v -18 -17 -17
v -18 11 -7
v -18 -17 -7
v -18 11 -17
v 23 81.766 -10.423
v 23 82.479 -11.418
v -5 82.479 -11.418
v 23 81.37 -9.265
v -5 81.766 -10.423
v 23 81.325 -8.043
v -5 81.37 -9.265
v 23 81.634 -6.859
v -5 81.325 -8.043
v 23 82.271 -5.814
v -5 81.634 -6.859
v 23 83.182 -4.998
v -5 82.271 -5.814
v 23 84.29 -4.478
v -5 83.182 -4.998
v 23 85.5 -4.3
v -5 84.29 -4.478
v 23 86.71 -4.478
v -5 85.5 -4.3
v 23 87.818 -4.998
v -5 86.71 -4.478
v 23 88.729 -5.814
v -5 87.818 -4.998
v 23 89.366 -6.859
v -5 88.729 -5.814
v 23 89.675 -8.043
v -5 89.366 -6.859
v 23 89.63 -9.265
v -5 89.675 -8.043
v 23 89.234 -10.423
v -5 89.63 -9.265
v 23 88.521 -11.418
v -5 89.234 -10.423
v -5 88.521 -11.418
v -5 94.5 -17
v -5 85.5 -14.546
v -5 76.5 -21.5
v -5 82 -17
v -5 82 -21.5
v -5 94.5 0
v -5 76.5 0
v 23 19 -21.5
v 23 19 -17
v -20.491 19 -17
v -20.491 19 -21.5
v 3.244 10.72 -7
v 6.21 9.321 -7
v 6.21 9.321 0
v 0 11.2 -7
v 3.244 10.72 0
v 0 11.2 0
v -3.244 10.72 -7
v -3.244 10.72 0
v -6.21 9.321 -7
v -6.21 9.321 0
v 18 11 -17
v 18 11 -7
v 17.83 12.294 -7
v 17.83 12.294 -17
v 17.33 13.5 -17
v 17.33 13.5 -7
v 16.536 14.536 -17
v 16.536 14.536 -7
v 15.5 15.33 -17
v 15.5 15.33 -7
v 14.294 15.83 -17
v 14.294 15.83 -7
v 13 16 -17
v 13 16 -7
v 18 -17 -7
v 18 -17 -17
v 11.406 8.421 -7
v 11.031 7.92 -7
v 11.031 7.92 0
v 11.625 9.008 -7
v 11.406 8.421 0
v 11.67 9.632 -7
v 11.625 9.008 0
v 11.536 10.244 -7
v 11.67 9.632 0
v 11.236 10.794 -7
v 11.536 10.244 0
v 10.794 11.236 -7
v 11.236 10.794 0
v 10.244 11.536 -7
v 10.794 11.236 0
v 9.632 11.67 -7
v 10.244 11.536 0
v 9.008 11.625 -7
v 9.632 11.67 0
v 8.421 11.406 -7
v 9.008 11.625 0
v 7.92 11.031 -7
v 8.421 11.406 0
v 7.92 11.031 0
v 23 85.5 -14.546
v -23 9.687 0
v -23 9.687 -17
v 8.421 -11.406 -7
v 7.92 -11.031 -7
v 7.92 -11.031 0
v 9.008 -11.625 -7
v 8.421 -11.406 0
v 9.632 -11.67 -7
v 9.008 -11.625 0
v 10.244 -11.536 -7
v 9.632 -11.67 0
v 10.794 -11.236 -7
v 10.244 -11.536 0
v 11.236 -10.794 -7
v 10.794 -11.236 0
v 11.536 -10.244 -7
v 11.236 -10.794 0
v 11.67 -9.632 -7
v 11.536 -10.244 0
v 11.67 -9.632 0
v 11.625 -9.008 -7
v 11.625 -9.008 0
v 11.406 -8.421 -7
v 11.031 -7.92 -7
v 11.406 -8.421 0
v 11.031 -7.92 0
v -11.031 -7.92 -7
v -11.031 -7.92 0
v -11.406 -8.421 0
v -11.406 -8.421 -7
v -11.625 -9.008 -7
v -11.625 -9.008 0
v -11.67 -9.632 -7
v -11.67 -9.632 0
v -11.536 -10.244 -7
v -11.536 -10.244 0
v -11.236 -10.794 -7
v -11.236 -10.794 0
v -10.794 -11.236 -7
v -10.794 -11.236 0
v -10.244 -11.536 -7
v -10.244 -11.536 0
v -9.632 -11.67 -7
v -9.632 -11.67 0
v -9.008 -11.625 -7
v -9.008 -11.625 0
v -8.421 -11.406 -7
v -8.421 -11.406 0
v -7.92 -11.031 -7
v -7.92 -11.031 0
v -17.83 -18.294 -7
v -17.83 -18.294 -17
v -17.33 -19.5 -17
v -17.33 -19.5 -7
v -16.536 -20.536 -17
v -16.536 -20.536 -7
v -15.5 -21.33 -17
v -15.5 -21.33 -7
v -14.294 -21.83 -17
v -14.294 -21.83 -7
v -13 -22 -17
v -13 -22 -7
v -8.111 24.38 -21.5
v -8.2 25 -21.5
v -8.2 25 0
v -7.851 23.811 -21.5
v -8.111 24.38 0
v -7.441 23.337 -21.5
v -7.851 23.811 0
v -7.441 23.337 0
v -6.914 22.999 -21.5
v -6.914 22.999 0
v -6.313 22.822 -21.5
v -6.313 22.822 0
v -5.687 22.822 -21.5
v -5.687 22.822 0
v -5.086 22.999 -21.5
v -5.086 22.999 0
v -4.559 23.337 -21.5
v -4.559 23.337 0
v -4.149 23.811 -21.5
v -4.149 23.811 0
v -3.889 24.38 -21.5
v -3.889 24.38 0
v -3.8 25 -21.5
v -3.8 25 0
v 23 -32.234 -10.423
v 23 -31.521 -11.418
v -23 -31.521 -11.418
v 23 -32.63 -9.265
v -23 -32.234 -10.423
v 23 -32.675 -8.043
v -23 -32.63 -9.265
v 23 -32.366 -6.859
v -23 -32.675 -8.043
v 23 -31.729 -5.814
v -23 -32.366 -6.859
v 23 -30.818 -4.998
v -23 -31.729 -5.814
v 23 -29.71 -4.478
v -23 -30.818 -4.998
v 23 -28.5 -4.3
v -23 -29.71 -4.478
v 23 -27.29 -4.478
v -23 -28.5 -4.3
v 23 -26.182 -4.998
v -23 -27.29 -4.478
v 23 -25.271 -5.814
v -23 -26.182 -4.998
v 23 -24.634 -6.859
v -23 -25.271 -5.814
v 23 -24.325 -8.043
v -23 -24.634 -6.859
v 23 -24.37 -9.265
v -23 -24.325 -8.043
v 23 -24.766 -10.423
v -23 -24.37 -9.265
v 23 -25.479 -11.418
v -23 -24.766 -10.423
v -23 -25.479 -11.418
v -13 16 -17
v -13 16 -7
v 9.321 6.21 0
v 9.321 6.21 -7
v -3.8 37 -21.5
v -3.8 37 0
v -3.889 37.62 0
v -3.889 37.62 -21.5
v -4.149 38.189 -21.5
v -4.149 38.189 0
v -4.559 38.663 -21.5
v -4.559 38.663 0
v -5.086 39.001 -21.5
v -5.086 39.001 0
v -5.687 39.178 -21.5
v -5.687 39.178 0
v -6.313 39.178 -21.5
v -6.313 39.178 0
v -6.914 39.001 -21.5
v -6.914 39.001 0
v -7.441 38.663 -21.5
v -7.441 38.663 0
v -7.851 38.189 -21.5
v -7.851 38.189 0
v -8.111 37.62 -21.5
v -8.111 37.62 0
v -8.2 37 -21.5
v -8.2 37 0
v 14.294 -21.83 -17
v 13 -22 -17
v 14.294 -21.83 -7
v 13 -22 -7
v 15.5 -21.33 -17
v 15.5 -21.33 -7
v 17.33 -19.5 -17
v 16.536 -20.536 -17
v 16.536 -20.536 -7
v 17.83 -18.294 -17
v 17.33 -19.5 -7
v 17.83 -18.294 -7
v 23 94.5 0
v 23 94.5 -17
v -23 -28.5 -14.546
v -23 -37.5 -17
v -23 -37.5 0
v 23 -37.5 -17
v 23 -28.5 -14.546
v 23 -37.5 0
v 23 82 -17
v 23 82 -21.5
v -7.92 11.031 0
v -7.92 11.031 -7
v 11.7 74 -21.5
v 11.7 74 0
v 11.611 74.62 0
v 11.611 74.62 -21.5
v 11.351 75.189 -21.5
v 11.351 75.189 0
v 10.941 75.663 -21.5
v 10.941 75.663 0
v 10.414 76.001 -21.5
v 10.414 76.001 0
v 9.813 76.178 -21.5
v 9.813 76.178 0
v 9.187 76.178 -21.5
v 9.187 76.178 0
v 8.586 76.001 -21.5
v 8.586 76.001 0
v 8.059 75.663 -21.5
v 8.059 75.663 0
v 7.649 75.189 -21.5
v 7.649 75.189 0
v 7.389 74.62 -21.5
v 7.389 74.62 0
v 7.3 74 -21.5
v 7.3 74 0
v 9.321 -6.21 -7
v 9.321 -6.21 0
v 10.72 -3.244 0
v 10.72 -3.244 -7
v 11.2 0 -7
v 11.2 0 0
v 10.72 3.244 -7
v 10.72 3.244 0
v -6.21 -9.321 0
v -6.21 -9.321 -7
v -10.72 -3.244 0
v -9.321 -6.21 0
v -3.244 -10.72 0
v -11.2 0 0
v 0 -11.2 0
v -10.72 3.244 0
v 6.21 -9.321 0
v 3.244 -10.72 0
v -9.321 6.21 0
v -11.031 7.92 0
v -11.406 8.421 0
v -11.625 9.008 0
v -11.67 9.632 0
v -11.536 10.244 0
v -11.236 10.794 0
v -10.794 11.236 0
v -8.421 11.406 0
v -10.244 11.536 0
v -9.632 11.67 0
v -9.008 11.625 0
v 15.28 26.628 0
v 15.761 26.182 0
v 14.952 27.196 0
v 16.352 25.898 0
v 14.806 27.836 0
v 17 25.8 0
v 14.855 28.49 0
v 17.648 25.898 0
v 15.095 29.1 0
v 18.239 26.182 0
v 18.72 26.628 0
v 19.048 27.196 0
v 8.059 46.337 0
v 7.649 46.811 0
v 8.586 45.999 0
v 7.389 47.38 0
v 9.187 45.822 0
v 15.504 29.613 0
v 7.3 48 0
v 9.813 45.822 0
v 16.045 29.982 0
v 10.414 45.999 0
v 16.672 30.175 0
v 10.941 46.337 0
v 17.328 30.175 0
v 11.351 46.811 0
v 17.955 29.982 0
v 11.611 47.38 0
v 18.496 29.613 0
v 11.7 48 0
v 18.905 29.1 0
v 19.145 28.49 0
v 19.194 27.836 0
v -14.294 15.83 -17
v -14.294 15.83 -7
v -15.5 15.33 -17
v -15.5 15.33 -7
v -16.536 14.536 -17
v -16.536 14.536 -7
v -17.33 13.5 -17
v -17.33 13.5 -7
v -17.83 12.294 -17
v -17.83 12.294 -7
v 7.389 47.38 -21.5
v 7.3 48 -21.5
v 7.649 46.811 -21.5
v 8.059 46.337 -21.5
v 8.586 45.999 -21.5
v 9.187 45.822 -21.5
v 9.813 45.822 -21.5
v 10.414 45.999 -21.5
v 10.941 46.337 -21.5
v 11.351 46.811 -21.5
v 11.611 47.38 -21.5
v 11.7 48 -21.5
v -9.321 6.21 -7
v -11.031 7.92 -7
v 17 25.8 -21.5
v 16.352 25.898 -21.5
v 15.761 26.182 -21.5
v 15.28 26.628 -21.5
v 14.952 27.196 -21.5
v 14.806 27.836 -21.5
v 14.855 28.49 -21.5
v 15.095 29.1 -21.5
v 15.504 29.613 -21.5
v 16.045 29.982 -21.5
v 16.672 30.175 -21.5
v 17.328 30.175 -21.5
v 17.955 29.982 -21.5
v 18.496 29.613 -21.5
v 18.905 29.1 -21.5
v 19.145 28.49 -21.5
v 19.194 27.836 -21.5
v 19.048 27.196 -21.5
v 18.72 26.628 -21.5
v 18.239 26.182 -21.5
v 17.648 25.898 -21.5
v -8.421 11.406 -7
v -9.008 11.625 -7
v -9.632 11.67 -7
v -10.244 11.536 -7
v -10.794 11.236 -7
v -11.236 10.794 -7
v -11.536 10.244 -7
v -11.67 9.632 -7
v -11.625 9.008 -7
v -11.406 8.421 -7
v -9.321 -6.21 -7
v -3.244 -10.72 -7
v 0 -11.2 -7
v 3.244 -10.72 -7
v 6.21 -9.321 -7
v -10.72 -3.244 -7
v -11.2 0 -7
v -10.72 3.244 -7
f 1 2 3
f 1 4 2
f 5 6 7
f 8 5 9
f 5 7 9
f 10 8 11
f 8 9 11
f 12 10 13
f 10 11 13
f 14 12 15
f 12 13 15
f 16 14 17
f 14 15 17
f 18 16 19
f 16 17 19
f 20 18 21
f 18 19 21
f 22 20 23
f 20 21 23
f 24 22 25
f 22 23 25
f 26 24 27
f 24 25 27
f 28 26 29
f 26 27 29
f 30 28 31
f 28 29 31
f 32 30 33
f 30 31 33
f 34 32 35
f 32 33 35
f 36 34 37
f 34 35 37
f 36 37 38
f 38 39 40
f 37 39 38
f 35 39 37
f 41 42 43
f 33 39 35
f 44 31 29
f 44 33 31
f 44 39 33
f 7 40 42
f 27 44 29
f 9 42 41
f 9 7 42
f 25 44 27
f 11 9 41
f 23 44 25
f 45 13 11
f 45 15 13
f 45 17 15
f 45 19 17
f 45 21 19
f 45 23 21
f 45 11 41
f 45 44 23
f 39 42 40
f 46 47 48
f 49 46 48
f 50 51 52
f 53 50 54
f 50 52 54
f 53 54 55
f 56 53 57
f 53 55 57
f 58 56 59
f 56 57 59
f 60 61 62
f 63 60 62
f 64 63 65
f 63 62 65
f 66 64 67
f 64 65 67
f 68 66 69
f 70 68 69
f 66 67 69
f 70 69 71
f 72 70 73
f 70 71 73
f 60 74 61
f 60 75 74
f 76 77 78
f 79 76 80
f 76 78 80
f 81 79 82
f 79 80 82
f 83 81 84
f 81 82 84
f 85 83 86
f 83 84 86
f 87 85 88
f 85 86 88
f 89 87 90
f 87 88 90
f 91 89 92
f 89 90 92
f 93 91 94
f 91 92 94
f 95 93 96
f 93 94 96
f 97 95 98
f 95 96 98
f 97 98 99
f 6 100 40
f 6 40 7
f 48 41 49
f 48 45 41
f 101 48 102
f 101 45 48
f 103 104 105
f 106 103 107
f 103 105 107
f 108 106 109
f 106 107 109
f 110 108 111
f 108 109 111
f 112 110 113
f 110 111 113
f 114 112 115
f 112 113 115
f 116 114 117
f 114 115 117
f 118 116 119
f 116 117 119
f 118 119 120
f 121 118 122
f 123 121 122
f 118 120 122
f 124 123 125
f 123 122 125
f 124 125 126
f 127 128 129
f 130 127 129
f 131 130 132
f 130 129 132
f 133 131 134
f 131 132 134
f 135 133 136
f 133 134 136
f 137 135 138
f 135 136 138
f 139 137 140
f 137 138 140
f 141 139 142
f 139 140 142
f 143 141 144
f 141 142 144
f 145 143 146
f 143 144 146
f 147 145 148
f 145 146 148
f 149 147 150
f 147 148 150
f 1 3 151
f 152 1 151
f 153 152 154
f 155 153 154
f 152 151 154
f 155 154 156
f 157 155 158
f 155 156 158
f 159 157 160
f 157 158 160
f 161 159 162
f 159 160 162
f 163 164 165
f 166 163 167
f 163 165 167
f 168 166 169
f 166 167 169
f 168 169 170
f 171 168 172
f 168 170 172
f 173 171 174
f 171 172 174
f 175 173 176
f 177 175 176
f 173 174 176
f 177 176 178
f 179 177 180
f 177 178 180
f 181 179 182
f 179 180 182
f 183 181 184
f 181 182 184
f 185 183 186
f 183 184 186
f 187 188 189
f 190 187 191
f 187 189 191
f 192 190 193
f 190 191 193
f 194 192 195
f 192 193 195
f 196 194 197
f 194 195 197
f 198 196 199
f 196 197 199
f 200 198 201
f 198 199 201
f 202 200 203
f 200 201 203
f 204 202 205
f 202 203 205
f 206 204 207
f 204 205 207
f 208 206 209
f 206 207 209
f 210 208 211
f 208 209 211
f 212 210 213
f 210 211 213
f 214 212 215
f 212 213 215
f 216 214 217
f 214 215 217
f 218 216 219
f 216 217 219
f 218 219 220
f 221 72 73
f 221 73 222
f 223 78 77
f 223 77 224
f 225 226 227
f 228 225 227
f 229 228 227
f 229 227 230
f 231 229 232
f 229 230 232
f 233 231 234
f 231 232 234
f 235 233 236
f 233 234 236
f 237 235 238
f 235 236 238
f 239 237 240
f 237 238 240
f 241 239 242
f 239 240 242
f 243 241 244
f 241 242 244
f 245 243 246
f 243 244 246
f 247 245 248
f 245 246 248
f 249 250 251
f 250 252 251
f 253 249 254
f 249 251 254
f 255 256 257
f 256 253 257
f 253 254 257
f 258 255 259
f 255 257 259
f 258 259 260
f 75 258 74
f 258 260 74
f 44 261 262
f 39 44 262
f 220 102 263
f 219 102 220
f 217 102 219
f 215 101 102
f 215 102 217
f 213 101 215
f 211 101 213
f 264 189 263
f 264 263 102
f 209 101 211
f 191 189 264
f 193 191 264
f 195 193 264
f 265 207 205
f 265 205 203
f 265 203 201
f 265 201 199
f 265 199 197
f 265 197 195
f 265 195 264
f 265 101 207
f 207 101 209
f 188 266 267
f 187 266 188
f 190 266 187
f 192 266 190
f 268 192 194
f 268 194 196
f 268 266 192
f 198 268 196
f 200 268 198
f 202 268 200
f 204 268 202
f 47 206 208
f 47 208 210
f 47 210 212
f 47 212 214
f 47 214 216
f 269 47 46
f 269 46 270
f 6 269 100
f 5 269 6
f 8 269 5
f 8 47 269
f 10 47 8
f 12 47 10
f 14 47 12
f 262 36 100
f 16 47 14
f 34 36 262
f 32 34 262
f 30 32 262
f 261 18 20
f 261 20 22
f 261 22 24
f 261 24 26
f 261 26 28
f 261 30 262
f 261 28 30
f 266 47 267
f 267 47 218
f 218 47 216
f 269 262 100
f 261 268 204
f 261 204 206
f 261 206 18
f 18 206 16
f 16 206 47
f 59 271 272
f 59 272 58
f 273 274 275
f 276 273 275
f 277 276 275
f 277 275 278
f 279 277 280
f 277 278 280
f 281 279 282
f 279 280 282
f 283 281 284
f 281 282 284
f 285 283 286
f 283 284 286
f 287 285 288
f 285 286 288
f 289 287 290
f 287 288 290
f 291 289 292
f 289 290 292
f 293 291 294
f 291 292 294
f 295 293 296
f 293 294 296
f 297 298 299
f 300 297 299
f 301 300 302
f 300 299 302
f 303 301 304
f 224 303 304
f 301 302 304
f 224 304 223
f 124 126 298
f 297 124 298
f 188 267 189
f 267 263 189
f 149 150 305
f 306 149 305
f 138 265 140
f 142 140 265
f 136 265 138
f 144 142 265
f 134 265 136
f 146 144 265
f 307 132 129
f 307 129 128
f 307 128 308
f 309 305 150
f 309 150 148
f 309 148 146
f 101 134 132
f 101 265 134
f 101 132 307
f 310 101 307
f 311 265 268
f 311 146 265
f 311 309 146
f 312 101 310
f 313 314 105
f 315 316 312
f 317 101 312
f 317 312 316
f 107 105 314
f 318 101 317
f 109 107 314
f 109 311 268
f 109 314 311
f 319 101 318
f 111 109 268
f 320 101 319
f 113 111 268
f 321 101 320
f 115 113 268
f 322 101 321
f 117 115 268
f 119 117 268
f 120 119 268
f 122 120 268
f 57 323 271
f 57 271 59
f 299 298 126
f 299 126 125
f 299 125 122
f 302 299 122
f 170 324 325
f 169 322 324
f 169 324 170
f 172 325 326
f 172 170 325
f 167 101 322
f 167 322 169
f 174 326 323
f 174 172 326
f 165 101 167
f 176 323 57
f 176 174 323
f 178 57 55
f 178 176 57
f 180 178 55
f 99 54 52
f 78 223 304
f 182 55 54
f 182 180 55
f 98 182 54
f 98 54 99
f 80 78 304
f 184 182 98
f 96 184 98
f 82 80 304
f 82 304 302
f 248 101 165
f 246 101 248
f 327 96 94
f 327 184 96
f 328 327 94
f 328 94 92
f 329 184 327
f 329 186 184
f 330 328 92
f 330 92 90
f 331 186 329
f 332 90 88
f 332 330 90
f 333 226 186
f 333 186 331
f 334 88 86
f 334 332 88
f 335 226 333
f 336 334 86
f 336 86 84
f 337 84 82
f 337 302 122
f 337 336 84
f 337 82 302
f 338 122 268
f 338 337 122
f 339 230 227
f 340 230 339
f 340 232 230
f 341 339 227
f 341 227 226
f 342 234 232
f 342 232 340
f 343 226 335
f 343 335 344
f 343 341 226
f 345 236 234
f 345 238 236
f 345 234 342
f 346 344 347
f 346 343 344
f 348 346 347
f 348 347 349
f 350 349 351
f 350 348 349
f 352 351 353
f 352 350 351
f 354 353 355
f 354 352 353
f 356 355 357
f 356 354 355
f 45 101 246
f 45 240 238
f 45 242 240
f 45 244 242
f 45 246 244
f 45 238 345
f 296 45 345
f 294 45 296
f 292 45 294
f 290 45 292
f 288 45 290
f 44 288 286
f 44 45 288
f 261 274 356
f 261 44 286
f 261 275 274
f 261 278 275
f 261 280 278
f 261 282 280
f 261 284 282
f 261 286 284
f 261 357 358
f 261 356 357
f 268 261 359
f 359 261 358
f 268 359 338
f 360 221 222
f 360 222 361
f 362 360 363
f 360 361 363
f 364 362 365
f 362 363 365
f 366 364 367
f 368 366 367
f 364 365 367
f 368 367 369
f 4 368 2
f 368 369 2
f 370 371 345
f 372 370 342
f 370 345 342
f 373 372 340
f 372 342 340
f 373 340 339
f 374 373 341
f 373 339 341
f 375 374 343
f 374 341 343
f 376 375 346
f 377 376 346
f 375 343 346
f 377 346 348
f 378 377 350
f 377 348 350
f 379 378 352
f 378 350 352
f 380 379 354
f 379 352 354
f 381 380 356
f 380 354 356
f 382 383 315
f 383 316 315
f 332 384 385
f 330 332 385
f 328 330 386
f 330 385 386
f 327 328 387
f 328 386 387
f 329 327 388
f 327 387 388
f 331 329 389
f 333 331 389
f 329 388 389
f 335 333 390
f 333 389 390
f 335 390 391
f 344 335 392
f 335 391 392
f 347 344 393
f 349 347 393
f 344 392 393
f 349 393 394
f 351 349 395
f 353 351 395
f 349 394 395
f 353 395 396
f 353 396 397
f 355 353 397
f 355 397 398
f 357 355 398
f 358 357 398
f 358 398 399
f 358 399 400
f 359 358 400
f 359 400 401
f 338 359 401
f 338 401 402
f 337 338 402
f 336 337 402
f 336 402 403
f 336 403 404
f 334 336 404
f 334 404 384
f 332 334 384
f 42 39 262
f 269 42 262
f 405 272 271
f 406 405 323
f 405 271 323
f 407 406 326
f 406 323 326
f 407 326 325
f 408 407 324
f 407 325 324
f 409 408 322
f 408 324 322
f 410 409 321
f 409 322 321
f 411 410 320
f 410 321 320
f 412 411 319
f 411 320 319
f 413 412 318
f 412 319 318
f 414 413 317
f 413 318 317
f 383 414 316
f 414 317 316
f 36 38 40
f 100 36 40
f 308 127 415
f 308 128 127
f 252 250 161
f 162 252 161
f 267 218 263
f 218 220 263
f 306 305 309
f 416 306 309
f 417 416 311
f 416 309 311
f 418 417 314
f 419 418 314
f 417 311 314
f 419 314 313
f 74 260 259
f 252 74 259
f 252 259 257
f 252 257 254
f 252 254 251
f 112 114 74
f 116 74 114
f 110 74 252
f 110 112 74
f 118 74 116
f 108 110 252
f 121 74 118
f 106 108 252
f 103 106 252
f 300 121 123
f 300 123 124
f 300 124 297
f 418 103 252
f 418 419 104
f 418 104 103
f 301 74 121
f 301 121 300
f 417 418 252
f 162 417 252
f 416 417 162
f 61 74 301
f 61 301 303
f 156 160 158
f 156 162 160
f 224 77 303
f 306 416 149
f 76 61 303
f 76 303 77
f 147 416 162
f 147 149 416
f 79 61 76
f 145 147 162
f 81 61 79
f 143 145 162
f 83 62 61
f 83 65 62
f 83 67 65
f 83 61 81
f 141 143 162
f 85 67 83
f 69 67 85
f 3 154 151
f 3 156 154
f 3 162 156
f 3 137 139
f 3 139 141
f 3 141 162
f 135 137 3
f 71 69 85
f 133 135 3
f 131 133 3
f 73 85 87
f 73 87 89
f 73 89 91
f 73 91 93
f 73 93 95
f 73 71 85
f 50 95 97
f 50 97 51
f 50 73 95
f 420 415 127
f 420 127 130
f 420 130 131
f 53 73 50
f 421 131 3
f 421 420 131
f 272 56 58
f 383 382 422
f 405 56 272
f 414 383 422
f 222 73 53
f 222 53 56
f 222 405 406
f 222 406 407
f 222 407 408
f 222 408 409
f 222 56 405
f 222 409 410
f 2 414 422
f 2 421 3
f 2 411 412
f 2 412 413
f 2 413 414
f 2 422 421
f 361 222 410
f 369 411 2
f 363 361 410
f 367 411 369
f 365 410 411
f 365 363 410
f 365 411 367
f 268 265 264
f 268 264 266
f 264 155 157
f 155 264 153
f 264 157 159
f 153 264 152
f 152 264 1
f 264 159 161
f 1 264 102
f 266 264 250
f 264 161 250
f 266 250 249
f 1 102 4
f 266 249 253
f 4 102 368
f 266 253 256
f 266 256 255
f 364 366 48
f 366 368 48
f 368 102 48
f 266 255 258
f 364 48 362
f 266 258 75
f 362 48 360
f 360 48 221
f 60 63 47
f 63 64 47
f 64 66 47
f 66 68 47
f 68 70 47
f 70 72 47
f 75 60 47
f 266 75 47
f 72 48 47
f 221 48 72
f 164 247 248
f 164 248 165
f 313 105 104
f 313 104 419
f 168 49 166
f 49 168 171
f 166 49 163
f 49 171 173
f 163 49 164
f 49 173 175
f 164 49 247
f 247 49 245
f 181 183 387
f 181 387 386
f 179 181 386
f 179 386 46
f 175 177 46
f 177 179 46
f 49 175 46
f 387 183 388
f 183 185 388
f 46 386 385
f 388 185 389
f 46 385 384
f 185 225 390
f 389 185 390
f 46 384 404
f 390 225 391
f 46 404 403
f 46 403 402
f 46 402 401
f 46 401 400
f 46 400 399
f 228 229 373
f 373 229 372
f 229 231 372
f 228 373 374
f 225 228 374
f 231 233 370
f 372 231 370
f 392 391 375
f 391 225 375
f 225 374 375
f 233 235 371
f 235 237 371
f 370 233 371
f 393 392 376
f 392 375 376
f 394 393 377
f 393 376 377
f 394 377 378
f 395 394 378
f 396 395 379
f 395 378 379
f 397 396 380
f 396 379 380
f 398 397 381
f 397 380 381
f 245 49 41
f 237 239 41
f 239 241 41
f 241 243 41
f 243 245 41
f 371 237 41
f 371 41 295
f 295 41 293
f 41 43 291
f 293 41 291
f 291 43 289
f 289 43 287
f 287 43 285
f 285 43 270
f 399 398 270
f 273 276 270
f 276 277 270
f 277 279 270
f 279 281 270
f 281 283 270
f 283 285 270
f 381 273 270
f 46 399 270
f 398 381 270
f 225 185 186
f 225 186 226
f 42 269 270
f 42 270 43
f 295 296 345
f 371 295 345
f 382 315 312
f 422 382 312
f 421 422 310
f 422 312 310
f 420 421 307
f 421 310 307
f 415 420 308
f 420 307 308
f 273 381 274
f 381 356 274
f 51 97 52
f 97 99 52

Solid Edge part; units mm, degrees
sketch "Sketch1" plane through (0, 0, 0) normal (0, 0, 1) x (1, 0, 0)
  line L0 (-23, -37.5) -> (23, -37.5)
  line L1 (23, -37.5) -> (23, 37.5)
  line L2 (23, 37.5) -> (-23, 37.5)
  line L3 (-23, 37.5) -> (-23, -37.5)
extrude "Protrusion1" add sketch "Sketch1" against normal blind 17
sketch "Sketch2" plane through (0, 0, 0) normal (0, 0, 1) x (1, 0, 0)
  arc A0 (-9.3209, -6.2097) -> (-9.3209, 6.2097) centre (0, 0) cw
  line L0 (-11.0309, 7.9196) -> (-9.3209, 6.2097)
  arc A1 (-11.0309, 7.9196) -> (-7.9196, 11.0309) centre (-9.4752, 9.4752) cw
  line L1 (-7.9196, 11.0309) -> (-6.2097, 9.3209)
  arc A2 (-6.2097, 9.3209) -> (6.2097, 9.3209) centre (0, 0) cw
  line L2 (7.9196, 11.0309) -> (6.2097, 9.3209)
  arc A3 (7.9196, 11.0309) -> (11.0309, 7.9196) centre (9.4752, 9.4752) cw
  line L3 (11.0309, 7.9196) -> (9.3209, 6.2097)
  arc A4 (9.3209, 6.2097) -> (9.3209, -6.2097) centre (0, 0) cw
  line L4 (11.0309, -7.9196) -> (9.3209, -6.2097)
  arc A5 (11.0309, -7.9196) -> (7.9196, -11.0309) centre (9.4752, -9.4752) cw
  line L5 (7.9196, -11.0309) -> (6.2097, -9.3209)
  arc A6 (6.2097, -9.3209) -> (-6.2097, -9.3209) centre (0, 0) cw
  line L6 (-7.9196, -11.0309) -> (-6.2097, -9.3209)
  arc A7 (-7.9196, -11.0309) -> (-11.0309, -7.9196) centre (-9.4752, -9.4752) cw
  line L7 (-11.0309, -7.9196) -> (-9.3209, -6.2097)
extrude "Cutout1" cut sketch "Sketch2" against normal through all
sketch "Sketch3" plane through (0, 37.5, -10) normal (0, 1, 0) x (-1, 0, 0)
  line L0 (-23, 10) -> (23, 10)
  line L1 (23, -7) -> (23, 10)
  line L2 (-23, -7) -> (23, -7)
  line L3 (-23, -7) -> (-23, 10)
extrude "ExtrudedProtrusion_2" add sketch "Sketch3" along normal blind 57
sketch "Sketch4" plane through (-23, 0, -10) normal (-1, 0, 0) x (0, -1, 0)
  circle A0 centre (28.5, 1.5) radius 4.2
  circle A1 centre (-85.5, 1.5) radius 4.2
  dimension "D1" = 9
  dimension "D2" = 114
  dimension "D3" = 8.4
  dimension "D4" = 8.4
extrude "Cutout2" cut sketch "Sketch4" against normal through all
sketch "Sketch5" plane through (-23, 0, -10) normal (-1, 0, 0) x (0, -1, 0)
  line L0 (-85.5, 1.5) -> (-88.5212, -1.4176)
  line L1 (-88.5212, -1.4176) -> (-85.5, -4.5461)
  line L2 (-85.5, -4.5461) -> (-82.4788, -1.4176)
  line L3 (-82.4788, -1.4176) -> (-85.5, 1.5)
  line L4 (28.5, 1.5) -> (25.4788, -1.4176)
  line L5 (25.4788, -1.4176) -> (28.5, -4.5461)
  line L6 (28.5, -4.5461) -> (31.5212, -1.4176)
  line L7 (31.5212, -1.4176) -> (28.5, 1.5)
extrude "Cutout3" cut sketch "Sketch5" against normal through all
sketch "Sketch6" plane through (0, 28.5, -17) normal (0, 0, -1) x (0, -1, 0)
  line L0 (-53.5, -23) -> (-53.5, 23)
  line L1 (-53.5, 23) -> (9.5, 23)
  line L2 (9.5, -23) -> (9.5, 23)
  line L3 (9.5, -23) -> (-53.5, -23)
extrude "ExtrudedProtrusion_4" add sketch "Sketch6" along normal blind 4.5
sketch "Sketch7" plane through (0, 28.5, -17) normal (0, 0, -1) x (0, -1, 0)
  line L0 (-66, 5) -> (-48, 5)
  line L1 (-48, 5) -> (18.8126, 23)
  dimension "D1" = 18
  dimension "D2" = 28
extrude "Cutout4" cut sketch "Sketch7" along normal through all and the other way through all material side at (-5.05, 85.5, -17)
sketch "Sketch8" plane through (0, 28.5, -17) normal (0, 0, -1) x (0, -1, 0)
  line L0 (-45.5, -7.3) -> (-19.5, -7.3)
  arc A0 (-19.5, -7.3) -> (-19.5, -11.7) centre (-19.5, -9.5) cw
  line L1 (-19.5, -11.7) -> (-45.5, -11.7)
  arc A1 (-45.5, -11.7) -> (-45.5, -7.3) centre (-45.5, -9.5) cw
  arc A2 (-8.5, 3.8) -> (-8.5, 8.2) centre (-8.5, 6) cw
  line L2 (-8.5, 8.2) -> (3.5, 8.2)
  arc A3 (3.5, 8.2) -> (3.5, 3.8) centre (3.5, 6) cw
  line L3 (3.5, 3.8) -> (-8.5, 3.8)
  circle A4 centre (0.5, -17) radius 2.2
  dimension "D1" = 5.4
  dimension "D2" = 16
  dimension "D3" = 12
  dimension "D4" = 28
  dimension "D5" = 25
  dimension "D6" = 5.4
  dimension "D7" = 12
  dimension "D8" = 5.4
  dimension "D9" = 0.5
  dimension "D10" = 0.5
  dimension "D11" = 0.5
extrude "Cutout5" cut sketch "Sketch8" along normal through all and the other way through all
sketch "Sketch9" plane through (0, -9.25, -17) normal (0, 0, -1) x (0, 1, 0)
  line L0 (-12.75, 18) -> (-12.75, -18)
  line L1 (25.25, -18) -> (-12.75, -18)
  line L2 (25.25, 18) -> (25.25, -18)
  line L3 (-12.75, 18) -> (25.25, 18)
  dimension "D1" = 5
  dimension "D2" = 36
  dimension "D3" = 16
  dimension "D4" = 22
extrude "ExtrudedCutout_8" cut sketch "Sketch9" against normal blind 10
fillet "Round_1" radius 5 4 edges at (18, 16, -12) (-18, 16, -12) (-18, -22, -12) (18, -22, -12)
